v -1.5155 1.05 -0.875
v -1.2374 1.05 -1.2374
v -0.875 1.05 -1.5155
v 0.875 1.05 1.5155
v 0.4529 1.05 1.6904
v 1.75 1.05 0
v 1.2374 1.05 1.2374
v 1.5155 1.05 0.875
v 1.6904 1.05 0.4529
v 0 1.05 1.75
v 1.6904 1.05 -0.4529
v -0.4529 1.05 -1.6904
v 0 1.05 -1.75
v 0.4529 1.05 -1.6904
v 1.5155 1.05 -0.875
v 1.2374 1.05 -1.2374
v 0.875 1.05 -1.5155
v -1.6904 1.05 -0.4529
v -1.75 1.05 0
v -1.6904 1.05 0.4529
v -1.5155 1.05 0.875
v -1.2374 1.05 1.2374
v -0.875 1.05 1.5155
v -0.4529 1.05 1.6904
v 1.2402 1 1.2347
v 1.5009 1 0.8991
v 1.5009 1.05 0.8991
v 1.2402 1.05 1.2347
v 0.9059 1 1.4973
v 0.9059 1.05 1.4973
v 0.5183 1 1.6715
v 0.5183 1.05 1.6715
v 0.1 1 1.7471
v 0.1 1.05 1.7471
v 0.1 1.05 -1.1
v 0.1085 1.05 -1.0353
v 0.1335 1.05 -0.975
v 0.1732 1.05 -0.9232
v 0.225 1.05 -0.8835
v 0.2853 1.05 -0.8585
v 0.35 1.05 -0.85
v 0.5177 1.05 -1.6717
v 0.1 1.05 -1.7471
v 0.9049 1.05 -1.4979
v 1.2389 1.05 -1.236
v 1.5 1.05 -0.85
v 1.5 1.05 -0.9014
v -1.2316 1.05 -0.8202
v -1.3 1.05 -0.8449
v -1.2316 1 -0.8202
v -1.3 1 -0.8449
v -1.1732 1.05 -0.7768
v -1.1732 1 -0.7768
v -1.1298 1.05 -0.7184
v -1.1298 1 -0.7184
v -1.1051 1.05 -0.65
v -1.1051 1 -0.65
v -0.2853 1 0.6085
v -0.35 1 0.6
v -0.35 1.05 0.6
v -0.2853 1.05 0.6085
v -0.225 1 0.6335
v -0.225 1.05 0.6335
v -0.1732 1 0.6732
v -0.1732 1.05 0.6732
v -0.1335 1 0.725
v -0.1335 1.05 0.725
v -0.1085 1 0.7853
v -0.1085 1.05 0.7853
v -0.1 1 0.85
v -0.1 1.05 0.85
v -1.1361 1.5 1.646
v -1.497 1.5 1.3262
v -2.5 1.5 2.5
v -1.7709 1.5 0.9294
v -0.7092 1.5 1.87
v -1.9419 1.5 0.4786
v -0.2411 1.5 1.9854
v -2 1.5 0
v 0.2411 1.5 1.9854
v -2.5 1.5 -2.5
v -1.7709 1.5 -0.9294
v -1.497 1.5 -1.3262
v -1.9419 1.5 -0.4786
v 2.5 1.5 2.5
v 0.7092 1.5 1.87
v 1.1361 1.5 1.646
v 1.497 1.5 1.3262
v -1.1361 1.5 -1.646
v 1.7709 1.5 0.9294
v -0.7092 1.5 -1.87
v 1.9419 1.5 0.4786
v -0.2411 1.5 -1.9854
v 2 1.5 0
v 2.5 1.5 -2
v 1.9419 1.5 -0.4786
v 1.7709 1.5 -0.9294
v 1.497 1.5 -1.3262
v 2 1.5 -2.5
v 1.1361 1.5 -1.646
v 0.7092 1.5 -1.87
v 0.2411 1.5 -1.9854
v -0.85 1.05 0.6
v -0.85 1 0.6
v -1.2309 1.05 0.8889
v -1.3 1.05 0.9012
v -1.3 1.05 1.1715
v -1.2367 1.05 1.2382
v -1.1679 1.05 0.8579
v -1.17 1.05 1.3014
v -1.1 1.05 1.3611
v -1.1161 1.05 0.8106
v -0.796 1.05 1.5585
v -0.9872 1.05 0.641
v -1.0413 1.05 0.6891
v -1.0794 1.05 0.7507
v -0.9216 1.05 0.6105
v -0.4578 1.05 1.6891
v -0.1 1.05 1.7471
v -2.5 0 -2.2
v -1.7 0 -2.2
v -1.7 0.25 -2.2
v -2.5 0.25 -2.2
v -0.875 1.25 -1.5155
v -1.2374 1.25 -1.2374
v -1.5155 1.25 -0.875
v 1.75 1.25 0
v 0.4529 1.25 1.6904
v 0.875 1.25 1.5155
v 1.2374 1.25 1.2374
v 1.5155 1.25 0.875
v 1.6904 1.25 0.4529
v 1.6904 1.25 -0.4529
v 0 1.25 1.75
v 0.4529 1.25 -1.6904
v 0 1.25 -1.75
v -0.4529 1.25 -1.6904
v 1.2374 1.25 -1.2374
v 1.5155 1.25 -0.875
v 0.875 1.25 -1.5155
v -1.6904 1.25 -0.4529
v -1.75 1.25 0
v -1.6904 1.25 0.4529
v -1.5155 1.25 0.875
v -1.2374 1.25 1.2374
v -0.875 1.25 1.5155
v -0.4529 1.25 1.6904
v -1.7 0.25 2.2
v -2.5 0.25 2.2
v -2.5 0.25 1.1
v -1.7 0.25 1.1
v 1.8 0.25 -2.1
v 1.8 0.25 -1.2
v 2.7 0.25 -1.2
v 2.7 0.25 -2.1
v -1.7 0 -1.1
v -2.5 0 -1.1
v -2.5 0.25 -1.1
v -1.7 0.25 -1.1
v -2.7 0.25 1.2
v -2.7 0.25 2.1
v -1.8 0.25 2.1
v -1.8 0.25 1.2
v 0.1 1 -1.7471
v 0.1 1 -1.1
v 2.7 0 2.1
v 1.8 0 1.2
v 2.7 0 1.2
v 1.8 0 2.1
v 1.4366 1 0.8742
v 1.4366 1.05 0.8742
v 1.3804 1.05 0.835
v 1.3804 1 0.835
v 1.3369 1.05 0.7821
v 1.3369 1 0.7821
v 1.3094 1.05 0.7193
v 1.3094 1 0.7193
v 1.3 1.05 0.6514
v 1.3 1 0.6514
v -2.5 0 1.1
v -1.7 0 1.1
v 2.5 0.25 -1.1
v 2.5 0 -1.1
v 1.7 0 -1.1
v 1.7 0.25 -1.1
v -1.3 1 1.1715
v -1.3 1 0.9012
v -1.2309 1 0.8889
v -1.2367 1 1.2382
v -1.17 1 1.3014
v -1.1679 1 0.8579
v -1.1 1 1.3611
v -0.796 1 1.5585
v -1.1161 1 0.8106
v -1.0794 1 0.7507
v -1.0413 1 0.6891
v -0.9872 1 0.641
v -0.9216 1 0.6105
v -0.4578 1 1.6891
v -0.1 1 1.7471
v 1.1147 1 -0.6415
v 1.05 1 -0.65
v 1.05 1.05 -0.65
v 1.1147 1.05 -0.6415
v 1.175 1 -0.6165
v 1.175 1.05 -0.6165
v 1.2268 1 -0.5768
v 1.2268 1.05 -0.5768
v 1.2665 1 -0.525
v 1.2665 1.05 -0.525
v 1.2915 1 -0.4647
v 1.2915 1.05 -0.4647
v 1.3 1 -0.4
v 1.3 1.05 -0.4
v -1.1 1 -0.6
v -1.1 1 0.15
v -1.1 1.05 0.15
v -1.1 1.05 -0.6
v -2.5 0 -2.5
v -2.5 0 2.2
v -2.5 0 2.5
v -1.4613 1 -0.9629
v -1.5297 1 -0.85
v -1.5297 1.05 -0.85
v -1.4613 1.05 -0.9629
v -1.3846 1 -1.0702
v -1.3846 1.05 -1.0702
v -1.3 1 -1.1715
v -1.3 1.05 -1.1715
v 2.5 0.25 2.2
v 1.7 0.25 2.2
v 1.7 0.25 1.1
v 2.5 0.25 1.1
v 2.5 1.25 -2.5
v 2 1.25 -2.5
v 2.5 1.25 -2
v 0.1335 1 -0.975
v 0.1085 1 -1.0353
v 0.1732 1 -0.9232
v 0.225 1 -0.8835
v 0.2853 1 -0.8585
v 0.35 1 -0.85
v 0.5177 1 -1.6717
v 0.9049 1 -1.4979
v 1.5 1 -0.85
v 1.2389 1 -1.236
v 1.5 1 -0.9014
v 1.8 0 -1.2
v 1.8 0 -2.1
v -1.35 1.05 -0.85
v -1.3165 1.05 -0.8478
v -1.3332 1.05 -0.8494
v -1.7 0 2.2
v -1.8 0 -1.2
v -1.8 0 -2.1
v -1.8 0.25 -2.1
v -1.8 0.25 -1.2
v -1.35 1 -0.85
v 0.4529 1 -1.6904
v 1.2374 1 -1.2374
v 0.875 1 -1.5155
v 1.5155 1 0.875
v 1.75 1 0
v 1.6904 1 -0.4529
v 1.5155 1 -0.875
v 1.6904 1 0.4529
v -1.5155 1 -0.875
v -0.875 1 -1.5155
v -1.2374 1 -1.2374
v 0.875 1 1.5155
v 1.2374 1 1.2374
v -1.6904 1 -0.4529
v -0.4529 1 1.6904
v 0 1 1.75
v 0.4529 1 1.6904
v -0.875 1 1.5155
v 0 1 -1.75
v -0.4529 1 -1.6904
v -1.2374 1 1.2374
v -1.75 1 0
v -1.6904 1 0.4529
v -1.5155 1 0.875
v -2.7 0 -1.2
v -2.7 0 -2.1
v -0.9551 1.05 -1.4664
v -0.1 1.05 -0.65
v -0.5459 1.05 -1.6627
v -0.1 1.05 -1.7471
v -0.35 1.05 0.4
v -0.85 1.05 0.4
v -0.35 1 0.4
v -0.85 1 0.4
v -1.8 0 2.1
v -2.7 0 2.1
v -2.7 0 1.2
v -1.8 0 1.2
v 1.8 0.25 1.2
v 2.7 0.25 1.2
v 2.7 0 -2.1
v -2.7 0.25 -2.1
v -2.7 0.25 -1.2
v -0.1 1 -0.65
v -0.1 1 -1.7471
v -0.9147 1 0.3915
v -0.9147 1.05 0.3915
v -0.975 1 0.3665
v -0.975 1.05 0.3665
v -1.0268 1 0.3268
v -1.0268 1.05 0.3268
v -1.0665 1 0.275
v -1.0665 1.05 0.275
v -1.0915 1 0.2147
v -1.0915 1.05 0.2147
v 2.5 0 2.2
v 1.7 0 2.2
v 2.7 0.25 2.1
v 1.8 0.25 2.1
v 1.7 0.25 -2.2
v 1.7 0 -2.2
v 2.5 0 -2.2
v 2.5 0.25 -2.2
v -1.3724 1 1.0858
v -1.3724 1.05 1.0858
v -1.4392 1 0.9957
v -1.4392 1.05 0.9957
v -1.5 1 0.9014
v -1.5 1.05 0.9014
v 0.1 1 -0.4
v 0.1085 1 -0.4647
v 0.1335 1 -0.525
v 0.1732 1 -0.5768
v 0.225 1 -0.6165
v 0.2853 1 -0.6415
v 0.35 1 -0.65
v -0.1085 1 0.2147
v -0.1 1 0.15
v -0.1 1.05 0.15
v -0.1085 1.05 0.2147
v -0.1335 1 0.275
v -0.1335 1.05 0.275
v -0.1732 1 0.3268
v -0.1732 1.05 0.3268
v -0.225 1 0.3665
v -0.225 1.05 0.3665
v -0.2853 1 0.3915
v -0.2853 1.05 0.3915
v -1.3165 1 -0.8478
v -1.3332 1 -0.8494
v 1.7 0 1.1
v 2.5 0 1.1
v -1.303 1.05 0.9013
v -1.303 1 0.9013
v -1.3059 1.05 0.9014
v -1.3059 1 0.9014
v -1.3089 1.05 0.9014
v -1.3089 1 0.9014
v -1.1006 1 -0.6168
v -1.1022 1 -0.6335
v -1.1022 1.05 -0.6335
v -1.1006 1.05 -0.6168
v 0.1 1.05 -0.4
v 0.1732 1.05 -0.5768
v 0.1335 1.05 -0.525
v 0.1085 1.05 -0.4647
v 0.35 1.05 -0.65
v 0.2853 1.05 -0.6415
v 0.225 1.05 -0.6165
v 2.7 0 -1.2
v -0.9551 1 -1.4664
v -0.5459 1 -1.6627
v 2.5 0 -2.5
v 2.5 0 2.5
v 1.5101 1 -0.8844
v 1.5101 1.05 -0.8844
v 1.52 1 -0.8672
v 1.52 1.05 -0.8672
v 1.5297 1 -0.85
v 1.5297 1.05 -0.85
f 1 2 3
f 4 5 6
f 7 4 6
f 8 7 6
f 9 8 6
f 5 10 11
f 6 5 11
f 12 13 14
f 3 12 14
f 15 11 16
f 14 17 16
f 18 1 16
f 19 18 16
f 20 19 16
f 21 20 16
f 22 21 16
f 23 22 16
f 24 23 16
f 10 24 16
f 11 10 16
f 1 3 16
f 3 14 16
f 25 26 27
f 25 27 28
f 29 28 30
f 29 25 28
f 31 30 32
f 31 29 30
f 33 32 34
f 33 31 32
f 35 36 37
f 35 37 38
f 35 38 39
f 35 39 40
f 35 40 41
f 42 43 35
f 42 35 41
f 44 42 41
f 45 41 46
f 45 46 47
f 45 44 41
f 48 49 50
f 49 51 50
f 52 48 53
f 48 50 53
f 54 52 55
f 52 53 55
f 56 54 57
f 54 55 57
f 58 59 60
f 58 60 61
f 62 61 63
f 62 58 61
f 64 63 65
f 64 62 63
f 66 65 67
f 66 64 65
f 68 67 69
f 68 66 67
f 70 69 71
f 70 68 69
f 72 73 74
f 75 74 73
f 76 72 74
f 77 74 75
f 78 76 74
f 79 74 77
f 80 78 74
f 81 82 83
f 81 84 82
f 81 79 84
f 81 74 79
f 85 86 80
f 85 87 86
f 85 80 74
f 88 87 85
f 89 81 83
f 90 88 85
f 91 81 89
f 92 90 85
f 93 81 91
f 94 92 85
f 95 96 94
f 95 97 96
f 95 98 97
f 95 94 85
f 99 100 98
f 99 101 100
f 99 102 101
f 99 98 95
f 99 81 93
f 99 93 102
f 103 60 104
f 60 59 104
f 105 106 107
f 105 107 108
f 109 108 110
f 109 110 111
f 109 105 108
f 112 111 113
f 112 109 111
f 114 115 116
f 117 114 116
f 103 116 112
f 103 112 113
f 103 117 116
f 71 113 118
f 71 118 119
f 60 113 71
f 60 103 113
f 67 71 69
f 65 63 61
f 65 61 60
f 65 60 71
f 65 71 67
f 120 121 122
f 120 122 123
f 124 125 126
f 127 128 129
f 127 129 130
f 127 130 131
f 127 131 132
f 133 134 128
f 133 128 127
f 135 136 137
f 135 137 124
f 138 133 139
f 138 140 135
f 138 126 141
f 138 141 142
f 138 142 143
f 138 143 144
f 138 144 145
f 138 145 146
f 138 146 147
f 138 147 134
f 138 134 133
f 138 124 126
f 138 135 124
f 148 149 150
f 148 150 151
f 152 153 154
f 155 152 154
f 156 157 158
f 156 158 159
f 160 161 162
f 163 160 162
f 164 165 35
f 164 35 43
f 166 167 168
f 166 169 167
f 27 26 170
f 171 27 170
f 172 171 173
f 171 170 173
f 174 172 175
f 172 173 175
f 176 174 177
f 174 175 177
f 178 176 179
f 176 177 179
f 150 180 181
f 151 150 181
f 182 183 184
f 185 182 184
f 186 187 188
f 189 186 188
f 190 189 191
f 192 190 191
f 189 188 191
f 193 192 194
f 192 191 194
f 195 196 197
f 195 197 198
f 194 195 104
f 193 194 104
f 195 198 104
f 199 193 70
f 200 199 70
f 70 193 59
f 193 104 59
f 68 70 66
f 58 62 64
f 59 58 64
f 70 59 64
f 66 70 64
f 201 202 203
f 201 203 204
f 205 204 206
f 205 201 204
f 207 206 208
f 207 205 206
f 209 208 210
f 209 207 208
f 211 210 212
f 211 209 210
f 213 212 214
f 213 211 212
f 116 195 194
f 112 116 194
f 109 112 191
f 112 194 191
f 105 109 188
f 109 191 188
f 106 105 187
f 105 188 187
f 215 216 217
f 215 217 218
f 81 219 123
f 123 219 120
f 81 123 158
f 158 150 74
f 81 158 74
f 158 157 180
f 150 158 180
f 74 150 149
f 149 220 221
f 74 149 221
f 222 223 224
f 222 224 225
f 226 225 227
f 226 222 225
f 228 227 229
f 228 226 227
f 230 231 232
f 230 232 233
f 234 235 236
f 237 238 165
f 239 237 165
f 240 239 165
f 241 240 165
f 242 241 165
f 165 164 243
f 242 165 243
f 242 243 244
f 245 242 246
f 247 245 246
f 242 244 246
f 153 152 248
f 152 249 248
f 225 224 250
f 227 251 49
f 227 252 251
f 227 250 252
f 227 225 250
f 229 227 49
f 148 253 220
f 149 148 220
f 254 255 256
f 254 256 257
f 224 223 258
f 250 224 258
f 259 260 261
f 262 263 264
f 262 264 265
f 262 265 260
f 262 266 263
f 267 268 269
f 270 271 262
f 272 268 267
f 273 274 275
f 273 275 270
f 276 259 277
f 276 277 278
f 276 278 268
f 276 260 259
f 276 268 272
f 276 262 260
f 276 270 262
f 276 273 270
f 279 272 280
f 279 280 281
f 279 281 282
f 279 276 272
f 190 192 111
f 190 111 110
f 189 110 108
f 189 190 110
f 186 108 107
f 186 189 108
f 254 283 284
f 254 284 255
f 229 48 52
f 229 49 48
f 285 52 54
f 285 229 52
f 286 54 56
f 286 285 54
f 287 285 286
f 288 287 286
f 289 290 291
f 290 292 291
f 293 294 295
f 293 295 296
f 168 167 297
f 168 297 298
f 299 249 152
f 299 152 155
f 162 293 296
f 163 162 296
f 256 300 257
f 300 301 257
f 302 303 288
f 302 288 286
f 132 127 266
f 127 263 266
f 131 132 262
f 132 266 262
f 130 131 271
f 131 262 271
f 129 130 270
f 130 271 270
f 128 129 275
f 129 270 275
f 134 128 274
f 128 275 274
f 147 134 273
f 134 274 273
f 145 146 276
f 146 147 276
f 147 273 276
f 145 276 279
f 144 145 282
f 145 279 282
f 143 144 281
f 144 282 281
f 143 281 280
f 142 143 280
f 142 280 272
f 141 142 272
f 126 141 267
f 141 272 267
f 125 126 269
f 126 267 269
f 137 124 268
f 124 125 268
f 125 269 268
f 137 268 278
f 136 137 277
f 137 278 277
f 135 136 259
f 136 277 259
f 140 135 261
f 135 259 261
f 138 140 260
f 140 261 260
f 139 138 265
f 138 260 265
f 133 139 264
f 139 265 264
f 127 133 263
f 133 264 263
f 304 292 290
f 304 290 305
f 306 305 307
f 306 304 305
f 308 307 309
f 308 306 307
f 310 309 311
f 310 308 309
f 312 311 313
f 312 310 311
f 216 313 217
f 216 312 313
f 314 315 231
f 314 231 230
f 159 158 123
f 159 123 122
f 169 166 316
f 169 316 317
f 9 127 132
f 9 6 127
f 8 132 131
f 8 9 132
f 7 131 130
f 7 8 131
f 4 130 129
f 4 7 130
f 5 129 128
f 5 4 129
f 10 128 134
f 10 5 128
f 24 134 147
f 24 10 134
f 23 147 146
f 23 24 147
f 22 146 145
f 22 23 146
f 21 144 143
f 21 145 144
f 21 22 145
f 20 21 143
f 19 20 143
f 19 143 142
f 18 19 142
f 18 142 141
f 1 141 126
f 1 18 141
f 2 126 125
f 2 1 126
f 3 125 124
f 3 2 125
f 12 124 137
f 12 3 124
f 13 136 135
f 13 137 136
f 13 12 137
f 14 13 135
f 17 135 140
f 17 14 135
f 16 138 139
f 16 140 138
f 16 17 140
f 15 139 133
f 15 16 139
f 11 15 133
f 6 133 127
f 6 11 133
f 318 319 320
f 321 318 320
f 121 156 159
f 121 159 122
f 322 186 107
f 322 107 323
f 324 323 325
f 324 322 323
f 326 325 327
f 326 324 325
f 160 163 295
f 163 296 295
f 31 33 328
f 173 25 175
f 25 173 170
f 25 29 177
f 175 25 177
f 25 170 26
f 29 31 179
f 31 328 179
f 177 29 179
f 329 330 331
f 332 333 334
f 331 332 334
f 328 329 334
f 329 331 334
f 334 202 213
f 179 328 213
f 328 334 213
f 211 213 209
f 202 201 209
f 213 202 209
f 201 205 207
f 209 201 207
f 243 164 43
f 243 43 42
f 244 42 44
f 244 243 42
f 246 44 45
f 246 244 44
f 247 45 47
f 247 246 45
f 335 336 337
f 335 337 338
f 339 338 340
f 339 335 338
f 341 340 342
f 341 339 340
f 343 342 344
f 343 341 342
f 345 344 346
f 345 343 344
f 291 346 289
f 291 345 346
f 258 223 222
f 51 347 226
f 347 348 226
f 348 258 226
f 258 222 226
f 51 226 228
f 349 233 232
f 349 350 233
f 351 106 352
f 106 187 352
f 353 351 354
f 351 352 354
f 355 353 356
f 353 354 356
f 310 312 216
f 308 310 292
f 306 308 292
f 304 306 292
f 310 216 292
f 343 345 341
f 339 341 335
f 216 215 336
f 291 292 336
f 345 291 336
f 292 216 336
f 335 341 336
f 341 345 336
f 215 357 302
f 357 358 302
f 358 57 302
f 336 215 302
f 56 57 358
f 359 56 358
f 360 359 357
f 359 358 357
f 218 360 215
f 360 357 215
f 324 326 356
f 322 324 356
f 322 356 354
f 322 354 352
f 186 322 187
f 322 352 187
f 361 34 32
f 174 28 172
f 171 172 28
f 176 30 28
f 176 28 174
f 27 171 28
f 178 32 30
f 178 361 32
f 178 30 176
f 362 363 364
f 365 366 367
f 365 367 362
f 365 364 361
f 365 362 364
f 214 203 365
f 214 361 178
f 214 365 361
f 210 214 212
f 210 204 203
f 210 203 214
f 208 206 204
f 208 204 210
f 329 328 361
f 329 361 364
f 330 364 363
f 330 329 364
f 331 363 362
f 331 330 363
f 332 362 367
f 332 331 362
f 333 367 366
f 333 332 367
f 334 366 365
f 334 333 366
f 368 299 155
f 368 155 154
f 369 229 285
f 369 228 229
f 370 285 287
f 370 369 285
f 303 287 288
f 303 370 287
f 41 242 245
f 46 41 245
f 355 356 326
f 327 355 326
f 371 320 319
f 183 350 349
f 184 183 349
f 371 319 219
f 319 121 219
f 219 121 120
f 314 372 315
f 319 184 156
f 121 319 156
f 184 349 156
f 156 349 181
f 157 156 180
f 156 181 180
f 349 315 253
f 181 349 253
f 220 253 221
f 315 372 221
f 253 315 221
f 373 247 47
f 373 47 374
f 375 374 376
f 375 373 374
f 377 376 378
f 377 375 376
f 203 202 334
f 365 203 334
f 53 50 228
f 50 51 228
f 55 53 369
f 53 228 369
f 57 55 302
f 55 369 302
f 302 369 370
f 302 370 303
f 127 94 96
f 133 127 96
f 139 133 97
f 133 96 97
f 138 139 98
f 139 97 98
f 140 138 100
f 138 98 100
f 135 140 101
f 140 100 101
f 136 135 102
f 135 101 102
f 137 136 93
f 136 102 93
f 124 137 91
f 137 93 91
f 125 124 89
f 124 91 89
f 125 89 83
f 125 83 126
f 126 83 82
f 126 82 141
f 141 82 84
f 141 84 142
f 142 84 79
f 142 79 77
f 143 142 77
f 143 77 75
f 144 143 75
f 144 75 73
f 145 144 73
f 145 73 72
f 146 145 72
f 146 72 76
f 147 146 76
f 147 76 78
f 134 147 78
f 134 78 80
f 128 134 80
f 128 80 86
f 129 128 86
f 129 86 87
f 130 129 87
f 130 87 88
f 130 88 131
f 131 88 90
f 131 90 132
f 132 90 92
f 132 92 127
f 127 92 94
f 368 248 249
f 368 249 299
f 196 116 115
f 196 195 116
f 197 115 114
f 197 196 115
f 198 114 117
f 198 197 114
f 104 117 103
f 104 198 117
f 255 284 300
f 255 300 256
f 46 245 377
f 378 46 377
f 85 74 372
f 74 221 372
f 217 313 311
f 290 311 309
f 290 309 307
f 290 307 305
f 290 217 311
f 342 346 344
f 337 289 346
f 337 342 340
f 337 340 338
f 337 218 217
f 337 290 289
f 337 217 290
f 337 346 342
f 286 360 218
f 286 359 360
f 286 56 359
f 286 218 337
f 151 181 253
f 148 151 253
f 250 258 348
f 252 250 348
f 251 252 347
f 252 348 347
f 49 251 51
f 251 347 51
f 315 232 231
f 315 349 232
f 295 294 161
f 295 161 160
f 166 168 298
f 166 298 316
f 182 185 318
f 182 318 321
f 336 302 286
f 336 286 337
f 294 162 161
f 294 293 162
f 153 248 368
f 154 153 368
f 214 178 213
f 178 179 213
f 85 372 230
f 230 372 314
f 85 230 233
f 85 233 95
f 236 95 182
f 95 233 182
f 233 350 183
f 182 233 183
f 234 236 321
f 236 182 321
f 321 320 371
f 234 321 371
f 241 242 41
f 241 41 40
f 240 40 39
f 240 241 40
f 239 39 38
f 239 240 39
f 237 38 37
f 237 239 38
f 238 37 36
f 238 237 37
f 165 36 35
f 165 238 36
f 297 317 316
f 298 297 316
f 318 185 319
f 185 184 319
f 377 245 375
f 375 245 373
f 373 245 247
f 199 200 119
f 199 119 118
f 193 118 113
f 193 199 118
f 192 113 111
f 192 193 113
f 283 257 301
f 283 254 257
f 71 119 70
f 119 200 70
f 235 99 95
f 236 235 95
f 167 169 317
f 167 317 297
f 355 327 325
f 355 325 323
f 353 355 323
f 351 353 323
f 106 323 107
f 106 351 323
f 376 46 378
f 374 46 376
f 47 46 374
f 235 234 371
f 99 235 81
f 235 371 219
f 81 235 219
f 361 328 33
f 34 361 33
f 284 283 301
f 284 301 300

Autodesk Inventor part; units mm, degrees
ref_plane "YZ Plane" through (0, 0, 0) normal (1, 0, 0) x (0, 1, 0)
ref_plane "XZ Plane" through (0, 0, 0) normal (0, 1, 0) x (-1, 0, 0)
ref_plane "XY Plane" through (0, 0, 0) normal (0, 0, 1) x (1, 0, 0)
sketch "Sketch1" plane through (0, 0, 0) normal (0, 1, 0) x (-1, 0, 0)
  line L0 (-2.5, 2.5) -> (2.5, 2.5)
  line L1 (2.5, 2.5) -> (2.5, -2.5)
  line L2 (2.5, -2.5) -> (-2.5, -2.5)
  line L3 (-2.5, -2.5) -> (-2.5, 2.5)
  line L4 (-2.5, 2.5) -> (2.5, -2.5) construction
  line L5 (2.5, 2.5) -> (-2.5, -2.5) construction
  point P0 (0, 0)
  dimension "d0" = 5
  dimension "d1" = 5
extrude "Extrusion1" add sketch "Sketch1" along normal blind 1
sketch "Sketch2" plane through (0, 1, 0) normal (0, 1, 0) x (1, 0, 0)
  circle A0 centre (0, 0) radius 2
  circle A1 centre (0, 0) radius 1.75
  dimension "d4" = 4
  dimension "d5" = 3.5
extrude "Extrusion2" add sketch "Sketch2" along normal blind 0.25
sketch "Sketch3" plane through (0, 1, 0) normal (0, 1, 0) x (1, 0, 0)
  line L0 (0.1, -2.6193) -> (-0.1, -2.6193)
  line L1 (-0.1, -2.6193) -> (-0.1, -0.85)
  line L2 (-0.1, 2.6193) -> (0.1, 2.6193)
  line L3 (0.1, 0.4) -> (0.1, -2.6193)
  line L4 (0, 0) -> (0, -0.5)
  line L5 (-0.35, -0.6) -> (-0.85, -0.6)
  line L6 (-2.9966, -0.6) -> (-2.9966, -0.4)
  line L7 (-0.85, -0.4) -> (-0.35, -0.4)
  line L8 (2.9966, -0.4) -> (2.9966, -0.6)
  line L9 (0, 0) -> (0, 0.5)
  line L10 (0, 0.5) -> (0, 0.75)
  line L11 (1.05, 0.65) -> (0.35, 0.65)
  line L12 (-3.251, 0.65) -> (-3.251, 0.85)
  line L13 (-3.251, 0.85) -> (-1.35, 0.85)
  line L14 (3.251, 0.85) -> (3.251, 0.65)
  line L15 (0, 0.75) -> (1.4, 0.75)
  line L16 (0, -0.5) -> (-1.2, -0.5)
  line L17 (-1.3, -2.7729) -> (-1.1, -2.7729)
  line L18 (-1.1, -2.7729) -> (-1.1, -0.85)
  line L19 (-1.1, 1.7729) -> (-1.3, 1.7729)
  line L20 (-1.3, 1.7729) -> (-1.3, -2.7729)
  line L21 (1.3, 3.2834) -> (1.5, 3.2834)
  line L22 (1.5, 3.2834) -> (1.5, -1.7834)
  line L23 (1.5, -1.7834) -> (1.3, -1.7834)
  line L24 (1.3, -0.6514) -> (1.3, 0.4)
  line L25 (1.3, 3.2834) -> (1.5, -1.7834) construction
  line L26 (1.5, 3.2834) -> (1.3, -1.7834) construction
  circle A0 centre (0, 0) radius 1.75
  circle A1 centre (0, 0) radius 1.75 projected
  line L27 (1.5, -0.9014) -> (1.55, -0.9014)
  arc A2 (1.3, -0.6514) -> (1.55, -0.9014) centre (1.55, -0.6514) ccw
  arc A3 (1.3, 0.4) -> (1.05, 0.65) centre (1.05, 0.4) ccw
  arc A4 (0.35, 0.65) -> (0.1, 0.4) centre (0.35, 0.4) ccw
  arc A5 (-0.1, -0.85) -> (-0.35, -0.6) centre (-0.35, -0.85) ccw
  arc A6 (-0.85, -0.6) -> (-1.0794, -0.7507) centre (-0.85, -0.85) ccw
  line L28 (-1.3089, -0.9014) -> (-1.5, -0.9014)
  arc A7 (-1.3089, -0.9014) -> (-1.0794, -0.7507) centre (-1.3089, -0.6514) ccw
  line L29 (-1.1, -0.15) -> (-1.1, 0.6)
  line L30 (3.251, 0.65) -> (-3.251, 0.65)
  line L31 (-0.1, 2.6193) -> (-0.1, -0.15)
  arc A8 (-0.35, -0.4) -> (-0.1, -0.15) centre (-0.35, -0.15) ccw
  arc A9 (-1.1, -0.15) -> (-0.85, -0.4) centre (-0.85, -0.15) ccw
  arc A10 (-1.1, 0.6) -> (-1.35, 0.85) centre (-1.35, 0.6) ccw
  line L32 (0.1, 1.1) -> (0.1, 2.0881)
  line L33 (0.35, 0.85) -> (3.251, 0.85)
  arc A11 (0.1, 1.1) -> (0.35, 0.85) centre (0.35, 1.1) ccw
  point P0 (0.1, -1.7471)
  point P1 (1.5, -0.9014)
  point P2 (1.5, -0.8963)
  point P3 (-0.1, -1.7471)
  point P4 (1.5297, 0.85)
  point P5 (0.1, 1.7471)
  point P6 (-0.1, 1.7471)
  point P7 (-1.5297, 0.85)
  dimension "d8" = 0.2
  dimension "d9" = 0.5
  dimension "d10" = 0.2
  dimension "d11" = 0.5
  dimension "d12" = 0.25
  dimension "d13" = 0.2
  dimension "d14" = 1.4
  dimension "d15" = 1.2
  dimension "d16" = 0.2
  dimension "d17" = 0.2
  dimension "d18" = 0.25
  dimension "d19" = 0.25
  dimension "d20" = 0.25
  dimension "d21" = 0.25
extrude "Extrusion3" add sketch "Sketch3" along normal blind 0.05 separate body contours L3 A4 L11 A3 L24 A2 A0 | A0 L20 A7 A6 L5 A5 L1 | A0 L28 A7 L20 | L33 A11 L32 A0 L22 | L22 A0 L33 | L31 A8 L7 A9 L29 A10 L30 | L30 A10 L20 A0 L31 | A10 L13 A0 L20
sketch "Sketch4" plane through (0, 0, 0) normal (0, -1, 0) x (1, 0, 0)
  line L0 (2.7, 2.1) -> (-2.7, 2.1)
  line L1 (-2.7, 2.1) -> (-2.7, -2.1)
  line L2 (-2.7, -2.1) -> (2.7, -2.1)
  line L3 (2.7, -2.1) -> (2.7, 2.1)
  line L4 (2.7, 2.1) -> (-2.7, -2.1) construction
  line L5 (-2.7, 2.1) -> (2.7, -2.1) construction
  line L6 (2.7, -2.1) -> (1.8, -2.1)
  line L7 (1.8, -2.1) -> (1.8, -1.2)
  line L8 (1.8, -1.2) -> (2.7, -1.2)
  line L9 (2.7, -1.2) -> (2.7, -2.1)
  line L10 (2.7, 2.1) -> (1.8, 2.1)
  line L11 (1.8, 2.1) -> (1.8, 1.2)
  line L12 (1.8, 1.2) -> (2.7, 1.2)
  line L13 (2.7, 1.2) -> (2.7, 2.1)
  line L14 (-2.7, 2.1) -> (-1.8, 2.1)
  line L15 (-1.8, 2.1) -> (-1.8, 1.2)
  line L16 (-1.8, 1.2) -> (-2.7, 1.2)
  line L17 (-2.7, 1.2) -> (-2.7, 2.1)
  line L18 (-2.7, -2.1) -> (-1.8, -2.1)
  line L19 (-1.8, -2.1) -> (-1.8, -1.2)
  line L20 (-1.8, -1.2) -> (-2.7, -1.2)
  line L21 (-2.7, -1.2) -> (-2.7, -2.1)
  line L22 (1.7, -1.1) -> (1.7, -2.2)
  line L23 (1.7, -2.2) -> (2.8, -2.2)
  line L24 (2.8, -2.2) -> (2.8, -1.1)
  line L25 (2.8, -1.1) -> (1.7, -1.1)
  line L26 (1.7, 1.1) -> (1.7, 2.2)
  line L27 (1.7, 2.2) -> (2.8, 2.2)
  line L28 (2.8, 2.2) -> (2.8, 1.1)
  line L29 (2.8, 1.1) -> (1.7, 1.1)
  line L30 (-1.7, 1.1) -> (-1.7, 2.2)
  line L31 (-1.7, 2.2) -> (-2.8, 2.2)
  line L32 (-2.8, 2.2) -> (-2.8, 1.1)
  line L33 (-2.8, 1.1) -> (-1.7, 1.1)
  line L34 (-2.8, -1.1) -> (-1.7, -1.1)
  line L35 (-1.7, -1.1) -> (-1.7, -2.2)
  line L36 (-1.7, -2.2) -> (-2.8, -2.2)
  line L37 (-2.8, -2.2) -> (-2.8, -1.1)
  point P0 (0, 0)
  dimension "d24" = 5.4
  dimension "d25" = 4.2
  dimension "d26" = 0.9
  dimension "d27" = 0.9
  dimension "d28" = 0.9
  dimension "d29" = 0.9
  dimension "d30" = 0.9
  dimension "d31" = 0.9
  dimension "d32" = 0.9
  dimension "d33" = 0.9
  dimension "d34" = 0.1
  dimension "d35" = 0.1
  dimension "d36" = 0.1
  dimension "d37" = 0.1
extrude "Extrusion4" cut sketch "Sketch4" against normal blind 0.25 contours L3 L12 L11 L0 | L0 L26 L27 L28 L29 L3 | L11 L12 L3 L29 L26 L0 | L30 L33 L1 L16 L15 L0 | L0 L1 L33 L32 L31 L30 | L25 L24 L23 L22 L2 L3 | L3 L8 L7 L2 L22 L25 | L15 L16 L1 L0 | L3 L2 L7 L8 | L34 L35 L2 L19 L20 L1 | L1 L2 L35 L36 L37 L34 | L20 L19 L2 L1 bodies 1
extrude "Extrusion5" add sketch "Sketch4" against normal blind 0.25 separate body contours L3 L12 L11 L0 | L15 L16 L1 L0 | L3 L2 L7 L8 | L20 L19 L2 L1
sketch "Sketch5" plane through (0, 1, 0) normal (0, 1, 0) x (1, 0, 0)
  line L0 (-2.5, -2.5) -> (2.5, -2.5) projected
  line L1 (2.5, 2.5) -> (-2.5, 2.5) projected
  line L2 (-2.5, -2.5) -> (2.5, -2.5)
  line L3 (2.5, -2.5) -> (2.5, 2.5)
  line L4 (2.5, 2.5) -> (-2.5, 2.5)
  line L5 (-2.5, 2.5) -> (-2.5, -2.5)
  circle A0 centre (0, 0) radius 1.75
extrude "Extrusion6" add sketch "Sketch5" along normal blind 0.5 bodies 1
sketch "Sketch6" plane through (0, 1.5, 0) normal (0, 1, 0) x (1, 0, 0)
  line L0 (2.5, 2.5) -> (-2.5, 2.5) projected
  line L1 (2.5, 2.5) -> (2, 2.5)
  line L2 (2, 2.5) -> (2.5, 2)
  line L3 (2.5, 1.1) -> (2.5, 2.2) projected
  line L4 (2.5, -2.5) -> (2.5, 2.5) projected
  line L5 (2.5, 2) -> (2.5, 2.5)
  point P0 (0, 0)
  dimension "d44" = 0.5
  dimension "d45" = 45
extrude "Extrusion7" cut sketch "Sketch6" against normal blind 0.25 bodies 1
chamfer "Chamfer1" distance 0.25 angle 45 1 edges at (-1.75, 1.5, 0)
sketch "Sketch7" plane through (0, 1.05, 0) normal (0, 1, 0) x (1, 0, 0)
  circle A0 centre (0, 0) radius 1.75
extrude "Extrusion8" add sketch "Sketch7" along normal blind 0.2 separate body
properties part number "WS2812b_SMD"
